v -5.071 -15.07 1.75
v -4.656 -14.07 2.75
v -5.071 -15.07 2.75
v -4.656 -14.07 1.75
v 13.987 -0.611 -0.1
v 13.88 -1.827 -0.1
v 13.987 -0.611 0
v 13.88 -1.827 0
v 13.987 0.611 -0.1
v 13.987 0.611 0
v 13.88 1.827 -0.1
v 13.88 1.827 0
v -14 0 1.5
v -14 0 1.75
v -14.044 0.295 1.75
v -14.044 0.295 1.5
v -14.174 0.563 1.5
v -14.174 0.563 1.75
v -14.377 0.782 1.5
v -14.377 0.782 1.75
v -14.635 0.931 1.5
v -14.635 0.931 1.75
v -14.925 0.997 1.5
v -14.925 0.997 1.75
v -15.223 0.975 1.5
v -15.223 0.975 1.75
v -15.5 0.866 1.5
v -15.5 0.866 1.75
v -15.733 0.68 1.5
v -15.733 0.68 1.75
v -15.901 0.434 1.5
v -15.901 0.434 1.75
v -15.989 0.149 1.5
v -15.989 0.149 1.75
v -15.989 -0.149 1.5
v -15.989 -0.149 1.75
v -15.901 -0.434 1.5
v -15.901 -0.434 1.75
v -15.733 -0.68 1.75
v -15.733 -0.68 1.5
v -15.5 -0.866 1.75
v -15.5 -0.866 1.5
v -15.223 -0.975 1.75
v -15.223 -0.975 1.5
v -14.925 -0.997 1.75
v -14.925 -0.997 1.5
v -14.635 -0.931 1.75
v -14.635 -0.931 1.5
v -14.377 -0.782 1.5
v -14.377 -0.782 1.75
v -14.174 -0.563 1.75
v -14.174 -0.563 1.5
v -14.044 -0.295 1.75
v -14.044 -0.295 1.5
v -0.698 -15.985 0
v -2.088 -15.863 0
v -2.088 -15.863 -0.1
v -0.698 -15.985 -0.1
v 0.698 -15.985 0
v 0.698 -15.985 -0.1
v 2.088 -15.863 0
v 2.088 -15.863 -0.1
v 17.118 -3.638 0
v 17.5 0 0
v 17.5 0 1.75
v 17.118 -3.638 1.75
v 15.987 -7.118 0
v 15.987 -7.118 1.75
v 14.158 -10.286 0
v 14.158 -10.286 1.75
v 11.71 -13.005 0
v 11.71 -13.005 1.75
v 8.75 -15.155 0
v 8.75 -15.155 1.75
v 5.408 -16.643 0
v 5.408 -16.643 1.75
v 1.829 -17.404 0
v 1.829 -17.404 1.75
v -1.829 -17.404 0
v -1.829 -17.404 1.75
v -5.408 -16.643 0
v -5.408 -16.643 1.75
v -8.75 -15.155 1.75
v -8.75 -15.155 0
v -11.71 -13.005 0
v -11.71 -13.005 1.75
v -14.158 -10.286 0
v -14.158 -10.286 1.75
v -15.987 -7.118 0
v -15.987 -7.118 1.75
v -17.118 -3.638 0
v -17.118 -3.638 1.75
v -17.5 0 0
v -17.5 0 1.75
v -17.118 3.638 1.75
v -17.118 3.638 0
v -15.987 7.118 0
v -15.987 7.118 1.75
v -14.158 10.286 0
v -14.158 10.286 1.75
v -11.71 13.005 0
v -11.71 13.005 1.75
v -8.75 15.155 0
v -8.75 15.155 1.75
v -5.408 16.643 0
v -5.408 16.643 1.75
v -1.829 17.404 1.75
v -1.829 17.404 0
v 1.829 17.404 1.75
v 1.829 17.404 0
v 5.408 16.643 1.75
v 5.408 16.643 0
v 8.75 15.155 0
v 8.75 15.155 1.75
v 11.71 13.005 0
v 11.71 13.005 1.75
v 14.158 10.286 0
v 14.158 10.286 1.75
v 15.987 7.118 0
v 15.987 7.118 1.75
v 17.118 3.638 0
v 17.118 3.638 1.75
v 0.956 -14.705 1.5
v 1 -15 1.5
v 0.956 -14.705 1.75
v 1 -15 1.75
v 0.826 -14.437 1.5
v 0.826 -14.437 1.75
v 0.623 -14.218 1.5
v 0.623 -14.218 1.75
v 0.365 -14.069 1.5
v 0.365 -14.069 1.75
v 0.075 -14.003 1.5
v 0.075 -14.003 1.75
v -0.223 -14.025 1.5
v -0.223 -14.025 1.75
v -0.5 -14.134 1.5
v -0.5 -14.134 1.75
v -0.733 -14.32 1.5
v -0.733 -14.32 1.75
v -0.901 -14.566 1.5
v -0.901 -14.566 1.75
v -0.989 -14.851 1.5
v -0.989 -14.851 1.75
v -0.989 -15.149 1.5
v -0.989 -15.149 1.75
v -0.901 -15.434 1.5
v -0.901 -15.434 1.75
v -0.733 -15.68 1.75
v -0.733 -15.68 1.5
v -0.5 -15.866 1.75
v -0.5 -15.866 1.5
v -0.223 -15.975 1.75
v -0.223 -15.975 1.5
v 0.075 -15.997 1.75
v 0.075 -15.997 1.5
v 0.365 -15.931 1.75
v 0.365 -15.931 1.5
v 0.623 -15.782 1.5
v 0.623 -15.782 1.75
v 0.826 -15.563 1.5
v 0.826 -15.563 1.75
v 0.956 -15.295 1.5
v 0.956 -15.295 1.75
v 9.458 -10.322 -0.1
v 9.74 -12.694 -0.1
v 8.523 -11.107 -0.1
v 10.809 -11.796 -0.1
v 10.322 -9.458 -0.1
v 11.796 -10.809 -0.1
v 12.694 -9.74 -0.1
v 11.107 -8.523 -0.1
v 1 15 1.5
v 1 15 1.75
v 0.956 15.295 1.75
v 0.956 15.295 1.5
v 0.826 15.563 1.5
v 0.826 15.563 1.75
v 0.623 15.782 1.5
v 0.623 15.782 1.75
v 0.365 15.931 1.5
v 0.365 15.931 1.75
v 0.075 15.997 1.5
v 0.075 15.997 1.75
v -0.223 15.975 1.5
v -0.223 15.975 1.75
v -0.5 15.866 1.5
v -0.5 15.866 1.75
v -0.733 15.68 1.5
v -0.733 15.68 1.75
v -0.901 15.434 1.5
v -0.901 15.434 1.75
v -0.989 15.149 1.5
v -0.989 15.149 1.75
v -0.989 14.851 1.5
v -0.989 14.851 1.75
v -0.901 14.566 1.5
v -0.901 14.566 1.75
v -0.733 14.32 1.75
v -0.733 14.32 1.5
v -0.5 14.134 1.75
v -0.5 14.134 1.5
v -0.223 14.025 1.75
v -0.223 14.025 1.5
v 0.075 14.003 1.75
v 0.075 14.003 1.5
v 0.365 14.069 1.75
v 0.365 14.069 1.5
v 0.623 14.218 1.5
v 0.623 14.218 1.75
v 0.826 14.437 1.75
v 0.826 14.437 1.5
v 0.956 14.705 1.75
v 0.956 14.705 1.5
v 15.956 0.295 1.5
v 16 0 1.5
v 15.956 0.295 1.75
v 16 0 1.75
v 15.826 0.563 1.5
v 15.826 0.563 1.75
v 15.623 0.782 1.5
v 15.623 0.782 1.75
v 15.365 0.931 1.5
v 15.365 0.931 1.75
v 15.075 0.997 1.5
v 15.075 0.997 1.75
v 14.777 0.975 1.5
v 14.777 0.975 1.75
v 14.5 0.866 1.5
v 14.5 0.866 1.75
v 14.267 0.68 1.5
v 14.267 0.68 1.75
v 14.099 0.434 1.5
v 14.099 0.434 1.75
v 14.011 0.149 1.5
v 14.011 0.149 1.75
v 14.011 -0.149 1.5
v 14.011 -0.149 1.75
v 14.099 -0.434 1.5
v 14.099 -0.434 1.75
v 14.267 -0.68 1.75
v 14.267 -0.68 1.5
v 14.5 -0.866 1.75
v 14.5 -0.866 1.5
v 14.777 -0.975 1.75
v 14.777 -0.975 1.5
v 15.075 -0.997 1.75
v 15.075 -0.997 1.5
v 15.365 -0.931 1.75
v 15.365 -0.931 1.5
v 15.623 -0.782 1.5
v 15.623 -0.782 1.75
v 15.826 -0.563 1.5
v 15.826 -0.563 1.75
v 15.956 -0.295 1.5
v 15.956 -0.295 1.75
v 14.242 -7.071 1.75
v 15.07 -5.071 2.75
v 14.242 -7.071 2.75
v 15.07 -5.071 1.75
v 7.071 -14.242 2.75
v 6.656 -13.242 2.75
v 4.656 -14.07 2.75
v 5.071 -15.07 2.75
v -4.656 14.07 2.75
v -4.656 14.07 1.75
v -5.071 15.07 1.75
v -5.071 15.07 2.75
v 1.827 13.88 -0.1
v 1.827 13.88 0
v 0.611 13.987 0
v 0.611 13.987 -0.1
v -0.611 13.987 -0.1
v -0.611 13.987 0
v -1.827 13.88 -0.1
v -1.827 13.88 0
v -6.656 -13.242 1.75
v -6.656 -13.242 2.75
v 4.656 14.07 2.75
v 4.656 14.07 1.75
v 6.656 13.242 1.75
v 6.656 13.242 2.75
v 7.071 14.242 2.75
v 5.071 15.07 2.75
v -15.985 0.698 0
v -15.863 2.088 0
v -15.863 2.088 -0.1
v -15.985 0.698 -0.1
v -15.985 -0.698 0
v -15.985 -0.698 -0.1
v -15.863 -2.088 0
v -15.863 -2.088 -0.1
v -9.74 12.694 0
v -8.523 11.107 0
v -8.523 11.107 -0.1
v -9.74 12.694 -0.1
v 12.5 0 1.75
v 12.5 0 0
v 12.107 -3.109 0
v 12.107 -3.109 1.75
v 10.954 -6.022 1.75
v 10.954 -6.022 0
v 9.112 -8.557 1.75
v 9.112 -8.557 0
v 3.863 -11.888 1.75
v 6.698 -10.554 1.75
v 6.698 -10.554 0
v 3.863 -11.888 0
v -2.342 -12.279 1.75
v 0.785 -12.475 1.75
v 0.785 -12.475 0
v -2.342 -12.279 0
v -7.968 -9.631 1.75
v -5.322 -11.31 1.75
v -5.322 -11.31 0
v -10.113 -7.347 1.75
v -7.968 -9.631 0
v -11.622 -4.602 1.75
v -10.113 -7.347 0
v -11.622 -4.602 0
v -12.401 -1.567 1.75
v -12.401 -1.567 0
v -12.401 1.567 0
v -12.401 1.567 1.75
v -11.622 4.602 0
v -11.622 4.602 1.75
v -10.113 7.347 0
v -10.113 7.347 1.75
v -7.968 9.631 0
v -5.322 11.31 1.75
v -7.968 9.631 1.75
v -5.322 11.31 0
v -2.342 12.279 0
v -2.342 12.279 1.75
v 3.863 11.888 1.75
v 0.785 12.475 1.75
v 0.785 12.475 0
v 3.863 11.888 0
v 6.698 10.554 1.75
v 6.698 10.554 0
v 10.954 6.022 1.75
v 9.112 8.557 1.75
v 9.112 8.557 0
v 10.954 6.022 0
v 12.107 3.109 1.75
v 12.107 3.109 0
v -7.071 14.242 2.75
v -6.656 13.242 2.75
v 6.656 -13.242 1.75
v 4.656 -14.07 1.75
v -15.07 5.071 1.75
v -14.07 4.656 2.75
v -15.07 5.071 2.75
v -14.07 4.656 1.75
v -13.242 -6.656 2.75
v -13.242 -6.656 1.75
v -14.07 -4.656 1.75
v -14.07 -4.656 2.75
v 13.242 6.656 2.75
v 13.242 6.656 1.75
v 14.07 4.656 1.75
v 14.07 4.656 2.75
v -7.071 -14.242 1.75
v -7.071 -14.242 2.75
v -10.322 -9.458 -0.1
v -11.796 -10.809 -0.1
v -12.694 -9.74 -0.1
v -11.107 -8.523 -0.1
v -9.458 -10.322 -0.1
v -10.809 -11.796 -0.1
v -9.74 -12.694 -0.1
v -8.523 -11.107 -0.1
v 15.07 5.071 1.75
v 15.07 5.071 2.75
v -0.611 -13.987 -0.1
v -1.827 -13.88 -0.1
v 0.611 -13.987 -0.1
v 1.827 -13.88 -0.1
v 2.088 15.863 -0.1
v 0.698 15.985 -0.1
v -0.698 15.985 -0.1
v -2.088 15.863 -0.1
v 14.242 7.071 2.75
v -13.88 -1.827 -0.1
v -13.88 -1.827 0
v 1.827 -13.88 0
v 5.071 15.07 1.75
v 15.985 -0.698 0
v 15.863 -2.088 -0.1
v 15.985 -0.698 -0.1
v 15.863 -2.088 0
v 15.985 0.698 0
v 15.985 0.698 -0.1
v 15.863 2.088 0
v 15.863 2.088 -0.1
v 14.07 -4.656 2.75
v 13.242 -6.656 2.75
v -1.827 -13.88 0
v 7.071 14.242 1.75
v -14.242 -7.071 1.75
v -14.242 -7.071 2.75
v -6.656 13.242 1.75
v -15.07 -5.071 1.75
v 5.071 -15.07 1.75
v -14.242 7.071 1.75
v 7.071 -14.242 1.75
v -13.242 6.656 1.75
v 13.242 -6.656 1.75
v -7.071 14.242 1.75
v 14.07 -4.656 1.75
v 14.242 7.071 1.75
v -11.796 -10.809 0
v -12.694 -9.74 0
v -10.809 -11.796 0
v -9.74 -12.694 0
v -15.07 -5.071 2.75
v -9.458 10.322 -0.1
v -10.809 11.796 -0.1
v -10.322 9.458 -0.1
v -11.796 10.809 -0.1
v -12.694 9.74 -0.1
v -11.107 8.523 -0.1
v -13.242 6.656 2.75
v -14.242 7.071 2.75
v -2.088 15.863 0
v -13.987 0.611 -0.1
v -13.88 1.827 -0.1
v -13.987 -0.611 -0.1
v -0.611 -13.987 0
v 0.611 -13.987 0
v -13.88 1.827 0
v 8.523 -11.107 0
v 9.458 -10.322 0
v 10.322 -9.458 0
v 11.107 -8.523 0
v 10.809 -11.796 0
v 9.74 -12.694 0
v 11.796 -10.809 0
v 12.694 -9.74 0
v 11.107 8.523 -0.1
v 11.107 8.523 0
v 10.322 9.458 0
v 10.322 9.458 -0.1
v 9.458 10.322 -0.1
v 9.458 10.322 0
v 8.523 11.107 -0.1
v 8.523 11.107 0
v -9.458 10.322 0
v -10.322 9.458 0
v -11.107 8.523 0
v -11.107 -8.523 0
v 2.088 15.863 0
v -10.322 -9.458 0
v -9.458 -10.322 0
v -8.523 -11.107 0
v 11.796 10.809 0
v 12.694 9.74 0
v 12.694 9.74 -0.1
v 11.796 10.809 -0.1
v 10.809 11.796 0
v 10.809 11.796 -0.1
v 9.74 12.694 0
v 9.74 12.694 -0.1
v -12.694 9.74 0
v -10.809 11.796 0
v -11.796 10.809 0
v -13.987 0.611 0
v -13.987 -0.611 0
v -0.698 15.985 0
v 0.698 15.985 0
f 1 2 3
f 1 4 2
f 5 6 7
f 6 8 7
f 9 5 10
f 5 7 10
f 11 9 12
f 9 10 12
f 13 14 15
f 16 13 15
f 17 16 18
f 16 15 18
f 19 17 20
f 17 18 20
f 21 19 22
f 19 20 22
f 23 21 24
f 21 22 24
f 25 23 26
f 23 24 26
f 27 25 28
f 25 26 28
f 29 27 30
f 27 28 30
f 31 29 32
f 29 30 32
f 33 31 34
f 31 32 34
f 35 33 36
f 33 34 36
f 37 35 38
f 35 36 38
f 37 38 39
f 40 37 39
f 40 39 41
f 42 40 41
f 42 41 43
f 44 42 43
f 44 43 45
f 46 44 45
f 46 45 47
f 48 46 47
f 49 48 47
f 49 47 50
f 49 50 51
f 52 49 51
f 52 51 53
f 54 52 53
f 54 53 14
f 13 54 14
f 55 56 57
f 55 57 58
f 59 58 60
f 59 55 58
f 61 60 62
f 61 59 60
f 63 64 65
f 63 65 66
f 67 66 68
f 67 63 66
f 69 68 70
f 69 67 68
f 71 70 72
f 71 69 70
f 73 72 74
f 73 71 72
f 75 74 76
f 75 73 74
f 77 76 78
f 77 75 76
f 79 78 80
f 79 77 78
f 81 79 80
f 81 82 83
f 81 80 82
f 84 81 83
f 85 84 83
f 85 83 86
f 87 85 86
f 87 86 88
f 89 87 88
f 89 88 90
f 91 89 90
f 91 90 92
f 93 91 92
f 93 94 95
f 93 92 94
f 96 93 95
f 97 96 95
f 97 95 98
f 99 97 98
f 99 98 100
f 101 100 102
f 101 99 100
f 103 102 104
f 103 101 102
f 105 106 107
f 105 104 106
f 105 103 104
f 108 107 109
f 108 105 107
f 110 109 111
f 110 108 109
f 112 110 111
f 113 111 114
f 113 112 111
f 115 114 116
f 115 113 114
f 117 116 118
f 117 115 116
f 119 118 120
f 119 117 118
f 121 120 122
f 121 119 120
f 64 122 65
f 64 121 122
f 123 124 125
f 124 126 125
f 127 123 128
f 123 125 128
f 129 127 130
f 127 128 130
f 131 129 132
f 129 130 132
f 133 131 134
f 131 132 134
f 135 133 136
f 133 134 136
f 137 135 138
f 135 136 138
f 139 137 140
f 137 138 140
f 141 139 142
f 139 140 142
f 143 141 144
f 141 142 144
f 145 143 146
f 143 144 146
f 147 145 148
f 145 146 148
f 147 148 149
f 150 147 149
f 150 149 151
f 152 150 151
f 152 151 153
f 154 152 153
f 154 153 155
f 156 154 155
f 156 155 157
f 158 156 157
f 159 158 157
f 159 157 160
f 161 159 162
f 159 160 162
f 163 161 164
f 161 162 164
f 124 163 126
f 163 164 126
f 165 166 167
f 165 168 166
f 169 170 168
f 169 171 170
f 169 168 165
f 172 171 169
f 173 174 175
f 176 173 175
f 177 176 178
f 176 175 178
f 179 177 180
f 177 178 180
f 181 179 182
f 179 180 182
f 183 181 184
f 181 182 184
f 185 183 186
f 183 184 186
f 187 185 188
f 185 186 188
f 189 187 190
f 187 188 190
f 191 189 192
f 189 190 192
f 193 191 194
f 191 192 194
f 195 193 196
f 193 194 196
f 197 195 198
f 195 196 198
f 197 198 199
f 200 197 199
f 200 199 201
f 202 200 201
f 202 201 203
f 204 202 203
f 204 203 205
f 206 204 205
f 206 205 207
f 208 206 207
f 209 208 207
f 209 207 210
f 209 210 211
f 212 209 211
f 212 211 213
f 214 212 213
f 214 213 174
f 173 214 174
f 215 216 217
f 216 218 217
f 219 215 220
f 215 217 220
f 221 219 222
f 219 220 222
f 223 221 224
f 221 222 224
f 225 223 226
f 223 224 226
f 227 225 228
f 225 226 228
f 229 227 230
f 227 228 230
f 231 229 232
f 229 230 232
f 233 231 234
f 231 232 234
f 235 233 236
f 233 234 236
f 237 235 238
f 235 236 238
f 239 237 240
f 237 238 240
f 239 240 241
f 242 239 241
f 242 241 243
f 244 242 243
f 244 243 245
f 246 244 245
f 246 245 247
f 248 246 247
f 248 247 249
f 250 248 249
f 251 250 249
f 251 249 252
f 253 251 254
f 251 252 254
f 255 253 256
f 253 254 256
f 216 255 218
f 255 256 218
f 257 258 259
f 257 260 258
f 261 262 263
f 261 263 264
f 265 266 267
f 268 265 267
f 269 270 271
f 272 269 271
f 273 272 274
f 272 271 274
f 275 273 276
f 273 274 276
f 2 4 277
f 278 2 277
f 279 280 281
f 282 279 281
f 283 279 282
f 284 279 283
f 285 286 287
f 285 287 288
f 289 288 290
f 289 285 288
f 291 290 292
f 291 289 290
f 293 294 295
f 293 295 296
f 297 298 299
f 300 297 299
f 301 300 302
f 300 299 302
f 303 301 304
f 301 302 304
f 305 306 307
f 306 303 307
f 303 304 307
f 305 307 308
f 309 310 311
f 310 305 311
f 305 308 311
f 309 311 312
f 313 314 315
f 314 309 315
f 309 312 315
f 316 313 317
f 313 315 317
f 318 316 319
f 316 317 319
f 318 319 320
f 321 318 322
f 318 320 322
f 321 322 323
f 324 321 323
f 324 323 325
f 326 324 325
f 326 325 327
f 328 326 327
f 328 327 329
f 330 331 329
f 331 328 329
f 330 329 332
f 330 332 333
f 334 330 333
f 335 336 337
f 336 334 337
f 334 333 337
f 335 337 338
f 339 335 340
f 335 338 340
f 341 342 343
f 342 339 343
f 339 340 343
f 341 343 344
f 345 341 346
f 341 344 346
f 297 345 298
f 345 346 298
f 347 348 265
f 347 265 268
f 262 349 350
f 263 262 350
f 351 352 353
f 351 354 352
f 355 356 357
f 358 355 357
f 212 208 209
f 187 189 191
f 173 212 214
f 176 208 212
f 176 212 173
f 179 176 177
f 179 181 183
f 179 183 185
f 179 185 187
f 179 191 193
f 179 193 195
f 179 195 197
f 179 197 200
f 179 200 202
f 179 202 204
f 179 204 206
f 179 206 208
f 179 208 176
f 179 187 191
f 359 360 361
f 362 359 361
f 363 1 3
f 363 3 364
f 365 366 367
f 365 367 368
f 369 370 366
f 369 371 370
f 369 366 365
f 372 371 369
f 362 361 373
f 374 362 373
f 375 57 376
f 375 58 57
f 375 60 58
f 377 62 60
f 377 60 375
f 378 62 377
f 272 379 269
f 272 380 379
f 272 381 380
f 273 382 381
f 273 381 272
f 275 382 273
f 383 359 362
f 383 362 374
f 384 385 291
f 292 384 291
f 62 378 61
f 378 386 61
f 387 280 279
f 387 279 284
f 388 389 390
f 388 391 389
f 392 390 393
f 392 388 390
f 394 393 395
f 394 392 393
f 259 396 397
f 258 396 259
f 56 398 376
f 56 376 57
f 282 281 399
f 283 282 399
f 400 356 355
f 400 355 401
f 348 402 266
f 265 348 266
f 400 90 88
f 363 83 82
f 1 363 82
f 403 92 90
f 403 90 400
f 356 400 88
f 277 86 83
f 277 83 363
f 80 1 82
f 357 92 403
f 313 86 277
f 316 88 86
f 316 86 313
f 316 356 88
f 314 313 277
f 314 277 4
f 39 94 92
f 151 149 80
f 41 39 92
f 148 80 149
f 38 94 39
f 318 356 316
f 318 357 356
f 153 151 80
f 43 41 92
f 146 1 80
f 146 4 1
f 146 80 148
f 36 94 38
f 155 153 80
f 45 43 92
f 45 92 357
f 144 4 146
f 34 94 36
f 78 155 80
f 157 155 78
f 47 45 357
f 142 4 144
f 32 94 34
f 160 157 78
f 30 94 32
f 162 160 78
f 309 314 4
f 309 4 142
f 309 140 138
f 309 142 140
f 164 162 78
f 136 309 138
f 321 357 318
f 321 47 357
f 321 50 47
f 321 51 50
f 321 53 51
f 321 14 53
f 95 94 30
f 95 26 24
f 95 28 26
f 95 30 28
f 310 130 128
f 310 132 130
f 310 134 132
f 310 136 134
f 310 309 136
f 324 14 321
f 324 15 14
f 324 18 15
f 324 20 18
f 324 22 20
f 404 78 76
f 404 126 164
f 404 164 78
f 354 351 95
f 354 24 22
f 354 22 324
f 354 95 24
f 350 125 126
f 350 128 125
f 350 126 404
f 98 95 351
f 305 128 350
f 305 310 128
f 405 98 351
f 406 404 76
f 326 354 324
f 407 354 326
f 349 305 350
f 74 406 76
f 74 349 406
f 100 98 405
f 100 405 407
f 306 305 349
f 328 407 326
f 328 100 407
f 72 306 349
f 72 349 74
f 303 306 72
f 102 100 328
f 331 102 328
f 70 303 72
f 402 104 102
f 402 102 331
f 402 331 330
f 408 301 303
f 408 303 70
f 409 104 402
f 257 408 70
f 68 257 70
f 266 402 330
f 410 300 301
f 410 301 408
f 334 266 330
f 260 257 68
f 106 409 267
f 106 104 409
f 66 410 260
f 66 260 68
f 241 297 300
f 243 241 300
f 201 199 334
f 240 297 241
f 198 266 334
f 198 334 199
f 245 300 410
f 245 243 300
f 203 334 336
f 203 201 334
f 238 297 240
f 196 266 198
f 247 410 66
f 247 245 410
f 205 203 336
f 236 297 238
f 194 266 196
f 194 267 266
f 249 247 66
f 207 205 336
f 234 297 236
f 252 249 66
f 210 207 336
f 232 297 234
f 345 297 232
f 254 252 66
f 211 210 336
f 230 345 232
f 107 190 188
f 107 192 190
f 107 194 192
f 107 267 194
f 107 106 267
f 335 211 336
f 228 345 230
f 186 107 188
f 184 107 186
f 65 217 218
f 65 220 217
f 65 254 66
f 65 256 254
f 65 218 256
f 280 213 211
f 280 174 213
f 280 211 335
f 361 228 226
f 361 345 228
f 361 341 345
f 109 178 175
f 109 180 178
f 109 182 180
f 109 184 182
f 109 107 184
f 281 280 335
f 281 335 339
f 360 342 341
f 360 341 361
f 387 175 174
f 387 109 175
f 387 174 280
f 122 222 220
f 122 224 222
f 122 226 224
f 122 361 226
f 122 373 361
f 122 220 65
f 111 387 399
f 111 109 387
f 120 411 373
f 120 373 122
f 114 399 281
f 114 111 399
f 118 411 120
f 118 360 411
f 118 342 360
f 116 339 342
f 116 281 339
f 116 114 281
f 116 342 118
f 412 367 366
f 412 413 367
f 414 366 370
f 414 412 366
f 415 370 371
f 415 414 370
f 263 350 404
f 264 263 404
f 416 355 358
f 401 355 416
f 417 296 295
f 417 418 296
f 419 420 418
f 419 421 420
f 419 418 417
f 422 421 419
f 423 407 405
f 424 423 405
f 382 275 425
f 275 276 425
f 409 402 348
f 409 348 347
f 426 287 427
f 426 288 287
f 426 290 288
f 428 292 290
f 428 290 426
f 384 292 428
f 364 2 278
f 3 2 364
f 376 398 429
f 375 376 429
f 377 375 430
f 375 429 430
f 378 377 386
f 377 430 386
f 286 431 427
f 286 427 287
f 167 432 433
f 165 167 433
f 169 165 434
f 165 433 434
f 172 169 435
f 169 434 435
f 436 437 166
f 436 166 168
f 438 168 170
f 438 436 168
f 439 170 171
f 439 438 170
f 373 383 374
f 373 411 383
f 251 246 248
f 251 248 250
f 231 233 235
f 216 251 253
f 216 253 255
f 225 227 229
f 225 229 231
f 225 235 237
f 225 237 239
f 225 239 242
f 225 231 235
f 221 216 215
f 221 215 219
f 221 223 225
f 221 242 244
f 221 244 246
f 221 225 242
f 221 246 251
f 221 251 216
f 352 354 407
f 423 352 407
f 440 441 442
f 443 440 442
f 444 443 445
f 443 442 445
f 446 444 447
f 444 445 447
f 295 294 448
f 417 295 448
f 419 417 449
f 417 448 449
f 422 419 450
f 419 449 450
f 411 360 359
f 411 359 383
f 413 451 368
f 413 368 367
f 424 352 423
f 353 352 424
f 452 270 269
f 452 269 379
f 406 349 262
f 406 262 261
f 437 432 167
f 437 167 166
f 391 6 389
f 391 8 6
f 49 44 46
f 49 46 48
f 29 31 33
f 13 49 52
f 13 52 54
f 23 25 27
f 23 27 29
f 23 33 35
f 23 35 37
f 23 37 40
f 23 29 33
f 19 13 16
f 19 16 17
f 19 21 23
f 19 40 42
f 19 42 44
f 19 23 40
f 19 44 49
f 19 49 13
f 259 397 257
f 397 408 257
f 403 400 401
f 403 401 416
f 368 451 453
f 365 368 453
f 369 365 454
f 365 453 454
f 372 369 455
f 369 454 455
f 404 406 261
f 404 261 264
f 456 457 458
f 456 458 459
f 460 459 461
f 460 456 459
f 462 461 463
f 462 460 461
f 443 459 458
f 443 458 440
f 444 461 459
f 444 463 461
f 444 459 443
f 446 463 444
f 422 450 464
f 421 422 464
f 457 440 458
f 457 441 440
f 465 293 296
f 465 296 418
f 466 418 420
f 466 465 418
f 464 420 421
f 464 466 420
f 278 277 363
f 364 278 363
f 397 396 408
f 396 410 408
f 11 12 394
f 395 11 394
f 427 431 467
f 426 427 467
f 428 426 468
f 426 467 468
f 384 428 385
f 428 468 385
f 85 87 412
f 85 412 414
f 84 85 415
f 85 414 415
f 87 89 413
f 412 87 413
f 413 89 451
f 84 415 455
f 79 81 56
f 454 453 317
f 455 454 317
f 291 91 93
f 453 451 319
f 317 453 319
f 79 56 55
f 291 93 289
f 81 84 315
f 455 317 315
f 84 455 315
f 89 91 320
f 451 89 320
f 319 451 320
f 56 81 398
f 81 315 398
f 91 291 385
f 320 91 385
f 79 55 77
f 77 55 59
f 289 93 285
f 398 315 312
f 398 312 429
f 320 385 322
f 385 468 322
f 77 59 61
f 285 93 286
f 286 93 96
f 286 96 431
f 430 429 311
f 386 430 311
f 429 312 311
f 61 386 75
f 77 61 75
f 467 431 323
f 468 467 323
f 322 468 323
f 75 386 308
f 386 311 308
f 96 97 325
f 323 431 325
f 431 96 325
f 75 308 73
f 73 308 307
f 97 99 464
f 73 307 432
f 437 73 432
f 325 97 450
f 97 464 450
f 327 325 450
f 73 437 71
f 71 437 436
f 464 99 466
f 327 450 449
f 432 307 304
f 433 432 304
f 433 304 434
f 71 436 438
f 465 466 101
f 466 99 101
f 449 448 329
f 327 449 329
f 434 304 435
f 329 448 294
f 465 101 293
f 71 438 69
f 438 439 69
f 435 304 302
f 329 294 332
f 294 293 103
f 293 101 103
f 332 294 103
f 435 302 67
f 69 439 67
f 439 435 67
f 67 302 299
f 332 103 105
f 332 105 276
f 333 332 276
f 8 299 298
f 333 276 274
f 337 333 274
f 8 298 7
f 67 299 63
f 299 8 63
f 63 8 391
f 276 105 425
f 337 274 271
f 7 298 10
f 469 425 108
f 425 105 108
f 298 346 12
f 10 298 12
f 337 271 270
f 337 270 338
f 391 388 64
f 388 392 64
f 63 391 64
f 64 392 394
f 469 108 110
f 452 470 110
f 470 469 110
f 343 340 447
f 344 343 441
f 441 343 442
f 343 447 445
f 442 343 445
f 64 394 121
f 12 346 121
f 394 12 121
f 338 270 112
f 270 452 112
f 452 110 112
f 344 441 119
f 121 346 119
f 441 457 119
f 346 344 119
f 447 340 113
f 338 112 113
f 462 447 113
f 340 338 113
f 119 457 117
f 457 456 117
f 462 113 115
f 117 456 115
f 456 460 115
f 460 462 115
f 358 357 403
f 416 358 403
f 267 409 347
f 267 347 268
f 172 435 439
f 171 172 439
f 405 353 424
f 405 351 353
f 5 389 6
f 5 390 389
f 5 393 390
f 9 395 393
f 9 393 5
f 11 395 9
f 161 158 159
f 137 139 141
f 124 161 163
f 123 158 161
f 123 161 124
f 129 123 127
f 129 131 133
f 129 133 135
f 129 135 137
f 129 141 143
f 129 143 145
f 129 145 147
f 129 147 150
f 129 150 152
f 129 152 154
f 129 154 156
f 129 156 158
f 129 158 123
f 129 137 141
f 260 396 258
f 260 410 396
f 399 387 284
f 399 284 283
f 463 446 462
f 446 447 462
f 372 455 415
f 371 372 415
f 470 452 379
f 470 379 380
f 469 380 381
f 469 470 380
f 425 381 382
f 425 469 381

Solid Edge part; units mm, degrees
sketch "Sketch1" plane through (0, 0, 0) normal (0, 0, 1) x (1, 0, 0)
  circle A0 centre (0, 0) radius 12.5
  circle A1 centre (0, 0) radius 17.5
extrude "Protrusion1" add sketch "Sketch1" along normal blind 1.75
sketch "Sketch2" plane through (0, 0, 1.75) normal (0, 0, 1) x (1, 0, 0)
  circle A0 centre (0, 15) radius 1
  circle A1 centre (15, 0) radius 1
  circle A2 centre (0, -15) radius 1
  circle A3 centre (-15, 0) radius 1
extrude "VaciadoExtruido_1" cut sketch "Sketch2" against normal blind 0.25
sketch "Sketch3" plane through (0, 0, 0) normal (0, 0, -1) x (0, 1, 0)
  line L0 (1.8274, 13.8802) -> (2.0884, 15.8631)
  line L1 (-1.8274, 13.8802) -> (-2.0884, 15.8631)
  arc A0 (-1.8274, 13.8802) -> (1.8274, 13.8802) centre (0, 0) cw
  arc A1 (-2.0884, 15.8631) -> (2.0884, 15.8631) centre (0, 0) cw
extrude "ProtrusiónExtruida_2" add sketch "Sketch3" along normal blind 0.1
pattern_circular "Pattern1" count 8 over 360 about axis through (0, 0, 0) along (0, 0, 1) of "ProtrusiónExtruida_2"
sketch "Sketch4" plane through (0, 0, 1.75) normal (0, 0, 1) x (0, 1, 0)
  line L0 (6.6565, -13.2417) -> (4.6565, -14.0701)
  line L1 (4.6565, -14.0701) -> (5.0707, -15.0701)
  line L2 (7.0707, -14.2417) -> (5.0707, -15.0701)
  line L3 (6.6565, -13.2417) -> (7.0707, -14.2417)
extrude "ProtrusiónExtruida_3" add sketch "Sketch4" along normal blind 1
pattern_circular "Pattern3" count 8 over 360 about axis through (0, 0, 1.75) along (0, 0, 1) of "ProtrusiónExtruida_3"
